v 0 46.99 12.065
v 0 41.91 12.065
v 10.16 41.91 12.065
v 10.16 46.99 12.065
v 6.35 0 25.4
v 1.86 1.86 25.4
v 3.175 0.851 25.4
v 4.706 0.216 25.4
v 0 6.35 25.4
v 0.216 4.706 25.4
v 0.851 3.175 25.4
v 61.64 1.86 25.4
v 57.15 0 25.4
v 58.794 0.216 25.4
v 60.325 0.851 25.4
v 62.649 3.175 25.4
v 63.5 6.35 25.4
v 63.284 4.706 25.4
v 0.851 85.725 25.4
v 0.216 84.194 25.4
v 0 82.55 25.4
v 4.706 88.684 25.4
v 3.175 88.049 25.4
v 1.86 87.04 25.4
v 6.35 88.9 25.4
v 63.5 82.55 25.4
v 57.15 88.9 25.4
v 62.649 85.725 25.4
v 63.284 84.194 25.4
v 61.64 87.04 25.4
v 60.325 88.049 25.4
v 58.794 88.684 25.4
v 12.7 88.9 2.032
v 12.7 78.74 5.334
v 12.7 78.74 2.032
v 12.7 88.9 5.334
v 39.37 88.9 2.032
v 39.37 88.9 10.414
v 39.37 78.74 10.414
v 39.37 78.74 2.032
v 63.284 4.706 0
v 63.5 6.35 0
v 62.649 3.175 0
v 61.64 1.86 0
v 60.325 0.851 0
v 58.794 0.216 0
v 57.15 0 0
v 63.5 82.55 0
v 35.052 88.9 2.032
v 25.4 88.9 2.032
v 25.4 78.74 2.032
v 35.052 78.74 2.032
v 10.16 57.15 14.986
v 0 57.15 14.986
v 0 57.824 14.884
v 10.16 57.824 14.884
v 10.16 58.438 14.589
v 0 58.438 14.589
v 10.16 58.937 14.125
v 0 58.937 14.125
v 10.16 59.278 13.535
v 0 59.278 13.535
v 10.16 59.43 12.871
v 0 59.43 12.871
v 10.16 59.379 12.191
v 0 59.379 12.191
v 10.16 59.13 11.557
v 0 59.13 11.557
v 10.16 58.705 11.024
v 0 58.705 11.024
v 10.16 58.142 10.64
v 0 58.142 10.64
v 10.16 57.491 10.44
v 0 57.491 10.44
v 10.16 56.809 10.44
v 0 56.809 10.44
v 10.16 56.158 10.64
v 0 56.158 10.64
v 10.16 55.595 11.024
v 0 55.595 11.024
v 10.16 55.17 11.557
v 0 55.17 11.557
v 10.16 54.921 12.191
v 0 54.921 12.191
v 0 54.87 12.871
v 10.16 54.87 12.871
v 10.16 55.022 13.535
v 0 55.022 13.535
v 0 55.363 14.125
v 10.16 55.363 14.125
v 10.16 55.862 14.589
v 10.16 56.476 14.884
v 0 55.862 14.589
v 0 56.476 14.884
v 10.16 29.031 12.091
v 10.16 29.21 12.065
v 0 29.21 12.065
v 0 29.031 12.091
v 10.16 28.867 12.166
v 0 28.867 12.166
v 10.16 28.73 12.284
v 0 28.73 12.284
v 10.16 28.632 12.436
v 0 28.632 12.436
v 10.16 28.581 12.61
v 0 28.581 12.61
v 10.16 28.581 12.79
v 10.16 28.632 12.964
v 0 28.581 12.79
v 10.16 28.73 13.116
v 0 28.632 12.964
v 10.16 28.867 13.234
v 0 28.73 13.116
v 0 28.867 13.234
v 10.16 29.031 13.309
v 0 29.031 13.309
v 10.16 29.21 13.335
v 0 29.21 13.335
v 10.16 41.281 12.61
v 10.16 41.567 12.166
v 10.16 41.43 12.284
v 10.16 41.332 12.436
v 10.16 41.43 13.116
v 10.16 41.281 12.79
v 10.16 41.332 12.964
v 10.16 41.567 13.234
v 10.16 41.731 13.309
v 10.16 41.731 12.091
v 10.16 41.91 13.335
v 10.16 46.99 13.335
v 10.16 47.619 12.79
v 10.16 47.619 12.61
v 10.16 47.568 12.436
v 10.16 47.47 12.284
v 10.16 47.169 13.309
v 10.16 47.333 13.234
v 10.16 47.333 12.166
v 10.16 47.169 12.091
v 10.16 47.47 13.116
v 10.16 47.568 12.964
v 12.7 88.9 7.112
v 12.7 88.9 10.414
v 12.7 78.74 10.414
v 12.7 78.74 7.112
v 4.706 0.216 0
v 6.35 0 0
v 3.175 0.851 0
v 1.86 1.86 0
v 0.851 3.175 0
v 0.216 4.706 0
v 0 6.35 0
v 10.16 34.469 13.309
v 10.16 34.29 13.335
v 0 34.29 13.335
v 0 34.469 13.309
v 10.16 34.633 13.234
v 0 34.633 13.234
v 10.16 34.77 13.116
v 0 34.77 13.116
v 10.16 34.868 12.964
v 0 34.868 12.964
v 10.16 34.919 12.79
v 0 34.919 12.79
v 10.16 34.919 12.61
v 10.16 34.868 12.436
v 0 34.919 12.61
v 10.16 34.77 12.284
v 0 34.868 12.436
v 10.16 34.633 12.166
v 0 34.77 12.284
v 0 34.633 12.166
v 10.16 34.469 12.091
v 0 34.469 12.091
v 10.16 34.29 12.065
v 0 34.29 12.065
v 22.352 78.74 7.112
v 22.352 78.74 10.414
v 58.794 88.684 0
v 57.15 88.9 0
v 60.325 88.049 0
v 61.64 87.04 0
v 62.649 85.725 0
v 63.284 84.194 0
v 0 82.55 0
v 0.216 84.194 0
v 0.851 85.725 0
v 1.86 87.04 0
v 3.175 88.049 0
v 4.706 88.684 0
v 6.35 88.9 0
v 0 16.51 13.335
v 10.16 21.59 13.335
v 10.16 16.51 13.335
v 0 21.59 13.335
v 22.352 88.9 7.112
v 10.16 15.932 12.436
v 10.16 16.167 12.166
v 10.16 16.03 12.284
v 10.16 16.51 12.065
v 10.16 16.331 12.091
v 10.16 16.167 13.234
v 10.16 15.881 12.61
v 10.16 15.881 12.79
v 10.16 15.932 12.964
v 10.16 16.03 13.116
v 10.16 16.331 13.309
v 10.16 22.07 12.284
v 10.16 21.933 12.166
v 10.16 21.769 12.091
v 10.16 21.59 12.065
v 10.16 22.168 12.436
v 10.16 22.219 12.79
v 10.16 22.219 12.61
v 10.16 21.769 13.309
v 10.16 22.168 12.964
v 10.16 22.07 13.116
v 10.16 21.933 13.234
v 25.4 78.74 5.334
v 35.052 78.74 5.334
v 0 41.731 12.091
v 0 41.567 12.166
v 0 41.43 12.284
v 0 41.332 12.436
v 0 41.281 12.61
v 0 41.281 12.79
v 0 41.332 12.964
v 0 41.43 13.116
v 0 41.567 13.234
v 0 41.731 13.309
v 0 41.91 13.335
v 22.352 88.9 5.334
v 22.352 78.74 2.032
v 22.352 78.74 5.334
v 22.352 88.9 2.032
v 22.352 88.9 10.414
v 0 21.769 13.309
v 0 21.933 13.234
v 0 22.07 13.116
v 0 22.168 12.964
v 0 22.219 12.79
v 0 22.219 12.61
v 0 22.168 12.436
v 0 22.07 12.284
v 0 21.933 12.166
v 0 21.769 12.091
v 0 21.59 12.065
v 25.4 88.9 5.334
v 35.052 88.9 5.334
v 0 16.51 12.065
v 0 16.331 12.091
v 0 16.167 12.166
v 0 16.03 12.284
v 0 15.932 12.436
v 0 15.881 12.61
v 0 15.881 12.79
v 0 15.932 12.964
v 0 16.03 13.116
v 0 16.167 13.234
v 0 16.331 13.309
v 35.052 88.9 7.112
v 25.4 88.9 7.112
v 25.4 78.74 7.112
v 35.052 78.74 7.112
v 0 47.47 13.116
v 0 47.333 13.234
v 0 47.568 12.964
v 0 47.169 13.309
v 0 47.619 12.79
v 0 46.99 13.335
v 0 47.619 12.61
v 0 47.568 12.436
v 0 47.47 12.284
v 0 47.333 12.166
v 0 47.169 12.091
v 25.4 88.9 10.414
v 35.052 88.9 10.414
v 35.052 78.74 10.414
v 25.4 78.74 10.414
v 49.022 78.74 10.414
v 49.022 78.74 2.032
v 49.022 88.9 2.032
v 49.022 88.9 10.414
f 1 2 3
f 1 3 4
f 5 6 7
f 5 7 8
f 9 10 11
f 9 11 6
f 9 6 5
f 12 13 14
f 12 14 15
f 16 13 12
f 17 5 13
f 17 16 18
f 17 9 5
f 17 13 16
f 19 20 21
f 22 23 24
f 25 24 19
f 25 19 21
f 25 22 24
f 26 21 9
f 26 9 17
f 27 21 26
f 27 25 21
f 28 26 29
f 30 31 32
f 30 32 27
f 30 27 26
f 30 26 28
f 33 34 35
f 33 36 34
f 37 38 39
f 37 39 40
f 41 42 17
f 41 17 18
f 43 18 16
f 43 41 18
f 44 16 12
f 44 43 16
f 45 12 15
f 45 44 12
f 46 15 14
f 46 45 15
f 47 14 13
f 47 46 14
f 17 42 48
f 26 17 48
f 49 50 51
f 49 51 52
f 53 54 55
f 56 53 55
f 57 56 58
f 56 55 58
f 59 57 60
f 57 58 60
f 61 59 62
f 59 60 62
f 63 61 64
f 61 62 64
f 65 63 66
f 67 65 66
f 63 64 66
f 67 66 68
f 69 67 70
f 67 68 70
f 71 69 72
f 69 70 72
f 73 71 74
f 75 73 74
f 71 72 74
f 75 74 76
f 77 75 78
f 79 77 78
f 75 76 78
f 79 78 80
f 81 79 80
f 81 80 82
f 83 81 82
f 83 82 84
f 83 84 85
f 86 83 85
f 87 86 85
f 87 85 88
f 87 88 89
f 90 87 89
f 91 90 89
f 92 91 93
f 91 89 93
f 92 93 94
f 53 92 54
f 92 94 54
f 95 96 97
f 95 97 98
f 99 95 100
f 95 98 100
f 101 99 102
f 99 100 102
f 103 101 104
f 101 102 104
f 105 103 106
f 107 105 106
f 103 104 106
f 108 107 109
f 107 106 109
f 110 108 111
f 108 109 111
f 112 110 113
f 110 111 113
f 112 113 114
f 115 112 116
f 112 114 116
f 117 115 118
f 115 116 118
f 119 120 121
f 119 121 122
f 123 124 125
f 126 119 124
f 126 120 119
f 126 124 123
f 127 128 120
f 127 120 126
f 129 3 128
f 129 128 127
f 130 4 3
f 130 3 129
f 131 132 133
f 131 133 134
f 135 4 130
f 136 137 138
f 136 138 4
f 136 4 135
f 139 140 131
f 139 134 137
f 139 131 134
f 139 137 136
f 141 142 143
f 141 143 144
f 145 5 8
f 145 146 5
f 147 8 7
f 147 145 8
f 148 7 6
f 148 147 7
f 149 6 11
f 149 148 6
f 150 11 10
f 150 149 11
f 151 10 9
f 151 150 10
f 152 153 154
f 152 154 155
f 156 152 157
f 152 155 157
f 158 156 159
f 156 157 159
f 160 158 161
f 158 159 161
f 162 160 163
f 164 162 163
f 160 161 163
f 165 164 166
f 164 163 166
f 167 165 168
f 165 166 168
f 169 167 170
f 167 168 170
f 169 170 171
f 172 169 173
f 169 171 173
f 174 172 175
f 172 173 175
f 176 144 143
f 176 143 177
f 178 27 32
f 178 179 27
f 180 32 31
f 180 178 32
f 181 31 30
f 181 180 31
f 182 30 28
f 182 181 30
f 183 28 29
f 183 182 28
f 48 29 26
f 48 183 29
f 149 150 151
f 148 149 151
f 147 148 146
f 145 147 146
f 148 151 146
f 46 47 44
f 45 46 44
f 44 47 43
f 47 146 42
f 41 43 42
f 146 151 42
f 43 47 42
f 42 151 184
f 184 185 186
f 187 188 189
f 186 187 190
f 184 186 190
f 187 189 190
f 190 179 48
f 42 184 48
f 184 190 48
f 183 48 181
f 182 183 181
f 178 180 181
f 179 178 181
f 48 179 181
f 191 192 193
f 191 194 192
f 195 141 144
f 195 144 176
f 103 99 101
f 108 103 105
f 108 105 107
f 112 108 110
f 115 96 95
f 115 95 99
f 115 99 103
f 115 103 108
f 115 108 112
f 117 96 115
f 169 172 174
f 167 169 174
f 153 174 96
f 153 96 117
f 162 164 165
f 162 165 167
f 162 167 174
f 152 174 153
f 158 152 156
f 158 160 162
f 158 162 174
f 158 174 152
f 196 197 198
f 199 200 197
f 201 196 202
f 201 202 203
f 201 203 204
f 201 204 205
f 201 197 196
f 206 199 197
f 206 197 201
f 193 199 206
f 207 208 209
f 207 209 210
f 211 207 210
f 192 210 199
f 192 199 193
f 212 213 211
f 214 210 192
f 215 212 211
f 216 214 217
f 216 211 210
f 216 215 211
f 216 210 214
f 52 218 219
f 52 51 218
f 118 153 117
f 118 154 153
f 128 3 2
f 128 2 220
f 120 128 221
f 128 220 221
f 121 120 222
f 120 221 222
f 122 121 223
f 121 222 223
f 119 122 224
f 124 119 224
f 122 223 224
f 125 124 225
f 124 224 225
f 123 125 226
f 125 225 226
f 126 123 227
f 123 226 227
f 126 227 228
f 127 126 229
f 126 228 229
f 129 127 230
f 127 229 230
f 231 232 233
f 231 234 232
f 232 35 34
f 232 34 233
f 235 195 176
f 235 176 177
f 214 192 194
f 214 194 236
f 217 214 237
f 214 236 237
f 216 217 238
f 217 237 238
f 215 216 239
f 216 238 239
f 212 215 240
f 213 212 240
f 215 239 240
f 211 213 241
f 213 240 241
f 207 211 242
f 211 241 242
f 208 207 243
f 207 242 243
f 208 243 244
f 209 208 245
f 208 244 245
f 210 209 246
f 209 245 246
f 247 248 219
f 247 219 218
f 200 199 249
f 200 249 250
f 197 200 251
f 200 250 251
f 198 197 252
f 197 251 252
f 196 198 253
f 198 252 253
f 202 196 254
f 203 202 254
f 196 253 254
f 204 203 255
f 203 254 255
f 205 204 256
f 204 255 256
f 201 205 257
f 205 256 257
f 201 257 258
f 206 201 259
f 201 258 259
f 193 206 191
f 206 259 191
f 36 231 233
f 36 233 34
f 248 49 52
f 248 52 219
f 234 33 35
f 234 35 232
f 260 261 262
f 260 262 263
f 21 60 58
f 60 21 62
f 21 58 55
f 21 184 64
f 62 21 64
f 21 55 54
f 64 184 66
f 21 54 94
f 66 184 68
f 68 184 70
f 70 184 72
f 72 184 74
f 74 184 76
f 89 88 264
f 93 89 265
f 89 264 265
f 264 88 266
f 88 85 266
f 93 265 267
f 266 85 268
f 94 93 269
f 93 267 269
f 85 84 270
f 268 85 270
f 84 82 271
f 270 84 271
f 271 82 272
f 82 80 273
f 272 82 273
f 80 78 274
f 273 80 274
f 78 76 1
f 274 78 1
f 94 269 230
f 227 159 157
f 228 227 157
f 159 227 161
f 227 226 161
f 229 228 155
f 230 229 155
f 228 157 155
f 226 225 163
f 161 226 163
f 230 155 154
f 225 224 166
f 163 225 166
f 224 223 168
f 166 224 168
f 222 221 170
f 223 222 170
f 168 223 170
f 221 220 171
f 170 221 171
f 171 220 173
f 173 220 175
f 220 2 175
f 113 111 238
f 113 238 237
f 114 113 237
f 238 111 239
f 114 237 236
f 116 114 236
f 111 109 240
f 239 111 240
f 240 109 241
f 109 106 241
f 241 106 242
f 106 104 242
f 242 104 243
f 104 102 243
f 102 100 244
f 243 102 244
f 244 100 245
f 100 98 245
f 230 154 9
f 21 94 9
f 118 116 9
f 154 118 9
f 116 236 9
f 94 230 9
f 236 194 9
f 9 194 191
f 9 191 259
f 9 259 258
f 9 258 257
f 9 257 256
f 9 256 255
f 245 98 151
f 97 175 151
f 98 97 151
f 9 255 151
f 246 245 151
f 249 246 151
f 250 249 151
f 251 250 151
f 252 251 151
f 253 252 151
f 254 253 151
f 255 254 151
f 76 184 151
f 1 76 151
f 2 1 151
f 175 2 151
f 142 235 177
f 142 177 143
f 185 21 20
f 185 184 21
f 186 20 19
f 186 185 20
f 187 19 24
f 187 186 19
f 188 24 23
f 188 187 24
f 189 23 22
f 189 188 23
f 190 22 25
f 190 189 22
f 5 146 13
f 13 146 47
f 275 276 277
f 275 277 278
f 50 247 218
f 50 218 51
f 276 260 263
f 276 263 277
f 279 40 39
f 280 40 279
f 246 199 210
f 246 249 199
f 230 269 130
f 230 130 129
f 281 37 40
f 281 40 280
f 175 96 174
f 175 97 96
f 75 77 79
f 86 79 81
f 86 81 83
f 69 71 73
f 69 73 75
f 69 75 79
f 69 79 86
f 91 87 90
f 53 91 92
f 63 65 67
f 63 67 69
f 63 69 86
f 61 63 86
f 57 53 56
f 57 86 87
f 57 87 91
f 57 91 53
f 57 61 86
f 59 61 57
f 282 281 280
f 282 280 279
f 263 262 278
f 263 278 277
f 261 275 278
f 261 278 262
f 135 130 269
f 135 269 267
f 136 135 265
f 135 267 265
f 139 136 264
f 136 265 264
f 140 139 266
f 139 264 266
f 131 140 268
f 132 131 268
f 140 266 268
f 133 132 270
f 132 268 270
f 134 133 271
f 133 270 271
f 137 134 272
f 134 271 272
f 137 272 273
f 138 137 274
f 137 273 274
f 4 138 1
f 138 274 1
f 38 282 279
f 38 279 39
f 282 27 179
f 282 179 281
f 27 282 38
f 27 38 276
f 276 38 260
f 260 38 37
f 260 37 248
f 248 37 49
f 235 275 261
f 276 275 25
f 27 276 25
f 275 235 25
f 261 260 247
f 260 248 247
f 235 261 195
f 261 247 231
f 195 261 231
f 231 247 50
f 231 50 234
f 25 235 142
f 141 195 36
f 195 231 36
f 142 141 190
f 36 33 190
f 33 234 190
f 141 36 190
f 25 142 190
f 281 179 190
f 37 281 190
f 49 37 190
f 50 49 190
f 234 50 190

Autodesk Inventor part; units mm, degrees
ref_plane "YZ Plane" through (0, 0, 0) normal (1, 0, 0) x (0, 1, 0)
ref_plane "XZ Plane" through (0, 0, 0) normal (0, 1, 0) x (-1, 0, 0)
ref_plane "XY Plane" through (0, 0, 0) normal (0, 0, 1) x (1, 0, 0)
sketch "Sketch1" plane through (0, 0, 0) normal (0, 0, 1) x (1, 0, 0)
  line L0 (6.35, 0) -> (57.15, 0)
  line L1 (63.5, 6.35) -> (63.5, 82.55)
  line L2 (57.15, 88.9) -> (6.35, 88.9)
  line L3 (0, 82.55) -> (0, 6.35)
  arc A0 (6.35, 88.9) -> (0, 82.55) centre (6.35, 82.55) ccw
  arc A1 (63.5, 82.55) -> (57.15, 88.9) centre (57.15, 82.55) ccw
  arc A2 (57.15, 0) -> (63.5, 6.35) centre (57.15, 6.35) ccw
  arc A3 (0, 6.35) -> (6.35, 0) centre (6.35, 6.35) ccw
  point P0 (0, 0)
  point P1 (63.5, 88.9)
  point P2 (63.5, 0)
  point P3 (0, 88.9)
  dimension "d0" = 88.9
  dimension "d1" = 63.5
  dimension "d2" = 6.35
extrude "Extrusion1" add sketch "Sketch1" along normal blind 25.4
sketch "Sketch2" plane through (6.35, 88.9, 0) normal (0, 1, 0) x (1, 0, 0)
  line L0 (6.35, -2.032) -> (16.002, -2.032)
  line L1 (16.002, -2.032) -> (16.002, -5.334)
  line L2 (16.002, -5.334) -> (6.35, -5.334)
  line L3 (6.35, -5.334) -> (6.35, -2.032)
  line L4 (0, 0) -> (0, -25.4) projected
  line L5 (50.8, 0) -> (0, 0) projected
  line L6 (28.702, -5.334) -> (19.05, -5.334)
  line L7 (19.05, -2.032) -> (28.702, -2.032)
  line L8 (28.702, -2.032) -> (28.702, -5.334)
  line L9 (19.05, -5.334) -> (19.05, -2.032)
  line L10 (16.002, -10.414) -> (6.35, -10.414)
  line L11 (6.35, -7.112) -> (16.002, -7.112)
  line L12 (16.002, -7.112) -> (16.002, -10.414)
  line L13 (6.35, -10.414) -> (6.35, -7.112)
  line L14 (28.702, -10.414) -> (19.05, -10.414)
  line L15 (19.05, -7.112) -> (28.702, -7.112)
  line L16 (28.702, -7.112) -> (28.702, -10.414)
  line L17 (19.05, -10.414) -> (19.05, -7.112)
  line L18 (33.02, -2.032) -> (42.672, -2.032)
  line L19 (42.672, -2.032) -> (42.672, -10.414)
  line L20 (42.672, -10.414) -> (33.02, -10.414)
  line L21 (33.02, -10.414) -> (33.02, -2.032)
  point P0 (-6.35, 0)
  point P1 (6.35, -3.683)
  point P2 (19.05, -3.683)
  point P3 (6.35, -8.763)
  point P4 (19.05, -8.763)
  point P5 (37.846, -2.032)
  dimension "d5" = 6.35
  dimension "d6" = 9.652
  dimension "d7" = 3.302
  dimension "d8" = 2.032
  dimension "d11" = 12.7
  dimension "d14" = 5.08
  dimension "d17" = 8.382
  dimension "d18" = 9.652
  dimension "d19" = 4.318
  dimension "d20" = 0
extrude "Extrusion2" cut sketch "Sketch2" against normal blind 10.16
sketch "Sketch3" plane through (0, 6.35, 0) normal (-1, 0, 0) x (0, 0, 1)
  line L0 (12.7, 10.16) -> (12.7, 15.24) construction
  line L1 (12.065, 10.16) -> (12.065, 15.24)
  line L2 (13.335, 15.24) -> (13.335, 10.16)
  arc A0 (12.065, 10.16) -> (13.335, 10.16) centre (12.7, 10.16) ccw
  arc A1 (13.335, 15.24) -> (12.065, 15.24) centre (12.7, 15.24) ccw
  line L3 (25.4, 76.2) -> (25.4, 0) projected
  line L4 (0, 0) -> (25.4, 0) projected
  line L5 (13.335, 27.94) -> (13.335, 22.86)
  arc A2 (12.065, 22.86) -> (13.335, 22.86) centre (12.7, 22.86) ccw
  line L6 (12.065, 22.86) -> (12.065, 27.94)
  arc A3 (13.335, 27.94) -> (12.065, 27.94) centre (12.7, 27.94) ccw
  line L7 (13.335, 40.64) -> (13.335, 35.56)
  arc A4 (12.065, 35.56) -> (13.335, 35.56) centre (12.7, 35.56) ccw
  line L8 (12.065, 35.56) -> (12.065, 40.64)
  arc A5 (13.335, 40.64) -> (12.065, 40.64) centre (12.7, 40.64) ccw
  circle A6 centre (12.7, 50.8) radius 2.286
  line L9 (0, 76.2) -> (25.4, 76.2) projected
  point P0 (0, -6.35)
  point P1 (12.7, 12.7)
  point P2 (12.7, 76.2)
  dimension "d23" = 5.08
  dimension "d24" = 0.635
  dimension "d25" = 12.7
  dimension "d26" = 12.7
  dimension "d29" = 12.7
  dimension "d34" = 4.572
  dimension "d35" = 12.7
  dimension "d36" = 25.4
extrude "Extrusion3" cut sketch "Sketch3" against normal blind 10.16
properties part number "RaspberryPi"
